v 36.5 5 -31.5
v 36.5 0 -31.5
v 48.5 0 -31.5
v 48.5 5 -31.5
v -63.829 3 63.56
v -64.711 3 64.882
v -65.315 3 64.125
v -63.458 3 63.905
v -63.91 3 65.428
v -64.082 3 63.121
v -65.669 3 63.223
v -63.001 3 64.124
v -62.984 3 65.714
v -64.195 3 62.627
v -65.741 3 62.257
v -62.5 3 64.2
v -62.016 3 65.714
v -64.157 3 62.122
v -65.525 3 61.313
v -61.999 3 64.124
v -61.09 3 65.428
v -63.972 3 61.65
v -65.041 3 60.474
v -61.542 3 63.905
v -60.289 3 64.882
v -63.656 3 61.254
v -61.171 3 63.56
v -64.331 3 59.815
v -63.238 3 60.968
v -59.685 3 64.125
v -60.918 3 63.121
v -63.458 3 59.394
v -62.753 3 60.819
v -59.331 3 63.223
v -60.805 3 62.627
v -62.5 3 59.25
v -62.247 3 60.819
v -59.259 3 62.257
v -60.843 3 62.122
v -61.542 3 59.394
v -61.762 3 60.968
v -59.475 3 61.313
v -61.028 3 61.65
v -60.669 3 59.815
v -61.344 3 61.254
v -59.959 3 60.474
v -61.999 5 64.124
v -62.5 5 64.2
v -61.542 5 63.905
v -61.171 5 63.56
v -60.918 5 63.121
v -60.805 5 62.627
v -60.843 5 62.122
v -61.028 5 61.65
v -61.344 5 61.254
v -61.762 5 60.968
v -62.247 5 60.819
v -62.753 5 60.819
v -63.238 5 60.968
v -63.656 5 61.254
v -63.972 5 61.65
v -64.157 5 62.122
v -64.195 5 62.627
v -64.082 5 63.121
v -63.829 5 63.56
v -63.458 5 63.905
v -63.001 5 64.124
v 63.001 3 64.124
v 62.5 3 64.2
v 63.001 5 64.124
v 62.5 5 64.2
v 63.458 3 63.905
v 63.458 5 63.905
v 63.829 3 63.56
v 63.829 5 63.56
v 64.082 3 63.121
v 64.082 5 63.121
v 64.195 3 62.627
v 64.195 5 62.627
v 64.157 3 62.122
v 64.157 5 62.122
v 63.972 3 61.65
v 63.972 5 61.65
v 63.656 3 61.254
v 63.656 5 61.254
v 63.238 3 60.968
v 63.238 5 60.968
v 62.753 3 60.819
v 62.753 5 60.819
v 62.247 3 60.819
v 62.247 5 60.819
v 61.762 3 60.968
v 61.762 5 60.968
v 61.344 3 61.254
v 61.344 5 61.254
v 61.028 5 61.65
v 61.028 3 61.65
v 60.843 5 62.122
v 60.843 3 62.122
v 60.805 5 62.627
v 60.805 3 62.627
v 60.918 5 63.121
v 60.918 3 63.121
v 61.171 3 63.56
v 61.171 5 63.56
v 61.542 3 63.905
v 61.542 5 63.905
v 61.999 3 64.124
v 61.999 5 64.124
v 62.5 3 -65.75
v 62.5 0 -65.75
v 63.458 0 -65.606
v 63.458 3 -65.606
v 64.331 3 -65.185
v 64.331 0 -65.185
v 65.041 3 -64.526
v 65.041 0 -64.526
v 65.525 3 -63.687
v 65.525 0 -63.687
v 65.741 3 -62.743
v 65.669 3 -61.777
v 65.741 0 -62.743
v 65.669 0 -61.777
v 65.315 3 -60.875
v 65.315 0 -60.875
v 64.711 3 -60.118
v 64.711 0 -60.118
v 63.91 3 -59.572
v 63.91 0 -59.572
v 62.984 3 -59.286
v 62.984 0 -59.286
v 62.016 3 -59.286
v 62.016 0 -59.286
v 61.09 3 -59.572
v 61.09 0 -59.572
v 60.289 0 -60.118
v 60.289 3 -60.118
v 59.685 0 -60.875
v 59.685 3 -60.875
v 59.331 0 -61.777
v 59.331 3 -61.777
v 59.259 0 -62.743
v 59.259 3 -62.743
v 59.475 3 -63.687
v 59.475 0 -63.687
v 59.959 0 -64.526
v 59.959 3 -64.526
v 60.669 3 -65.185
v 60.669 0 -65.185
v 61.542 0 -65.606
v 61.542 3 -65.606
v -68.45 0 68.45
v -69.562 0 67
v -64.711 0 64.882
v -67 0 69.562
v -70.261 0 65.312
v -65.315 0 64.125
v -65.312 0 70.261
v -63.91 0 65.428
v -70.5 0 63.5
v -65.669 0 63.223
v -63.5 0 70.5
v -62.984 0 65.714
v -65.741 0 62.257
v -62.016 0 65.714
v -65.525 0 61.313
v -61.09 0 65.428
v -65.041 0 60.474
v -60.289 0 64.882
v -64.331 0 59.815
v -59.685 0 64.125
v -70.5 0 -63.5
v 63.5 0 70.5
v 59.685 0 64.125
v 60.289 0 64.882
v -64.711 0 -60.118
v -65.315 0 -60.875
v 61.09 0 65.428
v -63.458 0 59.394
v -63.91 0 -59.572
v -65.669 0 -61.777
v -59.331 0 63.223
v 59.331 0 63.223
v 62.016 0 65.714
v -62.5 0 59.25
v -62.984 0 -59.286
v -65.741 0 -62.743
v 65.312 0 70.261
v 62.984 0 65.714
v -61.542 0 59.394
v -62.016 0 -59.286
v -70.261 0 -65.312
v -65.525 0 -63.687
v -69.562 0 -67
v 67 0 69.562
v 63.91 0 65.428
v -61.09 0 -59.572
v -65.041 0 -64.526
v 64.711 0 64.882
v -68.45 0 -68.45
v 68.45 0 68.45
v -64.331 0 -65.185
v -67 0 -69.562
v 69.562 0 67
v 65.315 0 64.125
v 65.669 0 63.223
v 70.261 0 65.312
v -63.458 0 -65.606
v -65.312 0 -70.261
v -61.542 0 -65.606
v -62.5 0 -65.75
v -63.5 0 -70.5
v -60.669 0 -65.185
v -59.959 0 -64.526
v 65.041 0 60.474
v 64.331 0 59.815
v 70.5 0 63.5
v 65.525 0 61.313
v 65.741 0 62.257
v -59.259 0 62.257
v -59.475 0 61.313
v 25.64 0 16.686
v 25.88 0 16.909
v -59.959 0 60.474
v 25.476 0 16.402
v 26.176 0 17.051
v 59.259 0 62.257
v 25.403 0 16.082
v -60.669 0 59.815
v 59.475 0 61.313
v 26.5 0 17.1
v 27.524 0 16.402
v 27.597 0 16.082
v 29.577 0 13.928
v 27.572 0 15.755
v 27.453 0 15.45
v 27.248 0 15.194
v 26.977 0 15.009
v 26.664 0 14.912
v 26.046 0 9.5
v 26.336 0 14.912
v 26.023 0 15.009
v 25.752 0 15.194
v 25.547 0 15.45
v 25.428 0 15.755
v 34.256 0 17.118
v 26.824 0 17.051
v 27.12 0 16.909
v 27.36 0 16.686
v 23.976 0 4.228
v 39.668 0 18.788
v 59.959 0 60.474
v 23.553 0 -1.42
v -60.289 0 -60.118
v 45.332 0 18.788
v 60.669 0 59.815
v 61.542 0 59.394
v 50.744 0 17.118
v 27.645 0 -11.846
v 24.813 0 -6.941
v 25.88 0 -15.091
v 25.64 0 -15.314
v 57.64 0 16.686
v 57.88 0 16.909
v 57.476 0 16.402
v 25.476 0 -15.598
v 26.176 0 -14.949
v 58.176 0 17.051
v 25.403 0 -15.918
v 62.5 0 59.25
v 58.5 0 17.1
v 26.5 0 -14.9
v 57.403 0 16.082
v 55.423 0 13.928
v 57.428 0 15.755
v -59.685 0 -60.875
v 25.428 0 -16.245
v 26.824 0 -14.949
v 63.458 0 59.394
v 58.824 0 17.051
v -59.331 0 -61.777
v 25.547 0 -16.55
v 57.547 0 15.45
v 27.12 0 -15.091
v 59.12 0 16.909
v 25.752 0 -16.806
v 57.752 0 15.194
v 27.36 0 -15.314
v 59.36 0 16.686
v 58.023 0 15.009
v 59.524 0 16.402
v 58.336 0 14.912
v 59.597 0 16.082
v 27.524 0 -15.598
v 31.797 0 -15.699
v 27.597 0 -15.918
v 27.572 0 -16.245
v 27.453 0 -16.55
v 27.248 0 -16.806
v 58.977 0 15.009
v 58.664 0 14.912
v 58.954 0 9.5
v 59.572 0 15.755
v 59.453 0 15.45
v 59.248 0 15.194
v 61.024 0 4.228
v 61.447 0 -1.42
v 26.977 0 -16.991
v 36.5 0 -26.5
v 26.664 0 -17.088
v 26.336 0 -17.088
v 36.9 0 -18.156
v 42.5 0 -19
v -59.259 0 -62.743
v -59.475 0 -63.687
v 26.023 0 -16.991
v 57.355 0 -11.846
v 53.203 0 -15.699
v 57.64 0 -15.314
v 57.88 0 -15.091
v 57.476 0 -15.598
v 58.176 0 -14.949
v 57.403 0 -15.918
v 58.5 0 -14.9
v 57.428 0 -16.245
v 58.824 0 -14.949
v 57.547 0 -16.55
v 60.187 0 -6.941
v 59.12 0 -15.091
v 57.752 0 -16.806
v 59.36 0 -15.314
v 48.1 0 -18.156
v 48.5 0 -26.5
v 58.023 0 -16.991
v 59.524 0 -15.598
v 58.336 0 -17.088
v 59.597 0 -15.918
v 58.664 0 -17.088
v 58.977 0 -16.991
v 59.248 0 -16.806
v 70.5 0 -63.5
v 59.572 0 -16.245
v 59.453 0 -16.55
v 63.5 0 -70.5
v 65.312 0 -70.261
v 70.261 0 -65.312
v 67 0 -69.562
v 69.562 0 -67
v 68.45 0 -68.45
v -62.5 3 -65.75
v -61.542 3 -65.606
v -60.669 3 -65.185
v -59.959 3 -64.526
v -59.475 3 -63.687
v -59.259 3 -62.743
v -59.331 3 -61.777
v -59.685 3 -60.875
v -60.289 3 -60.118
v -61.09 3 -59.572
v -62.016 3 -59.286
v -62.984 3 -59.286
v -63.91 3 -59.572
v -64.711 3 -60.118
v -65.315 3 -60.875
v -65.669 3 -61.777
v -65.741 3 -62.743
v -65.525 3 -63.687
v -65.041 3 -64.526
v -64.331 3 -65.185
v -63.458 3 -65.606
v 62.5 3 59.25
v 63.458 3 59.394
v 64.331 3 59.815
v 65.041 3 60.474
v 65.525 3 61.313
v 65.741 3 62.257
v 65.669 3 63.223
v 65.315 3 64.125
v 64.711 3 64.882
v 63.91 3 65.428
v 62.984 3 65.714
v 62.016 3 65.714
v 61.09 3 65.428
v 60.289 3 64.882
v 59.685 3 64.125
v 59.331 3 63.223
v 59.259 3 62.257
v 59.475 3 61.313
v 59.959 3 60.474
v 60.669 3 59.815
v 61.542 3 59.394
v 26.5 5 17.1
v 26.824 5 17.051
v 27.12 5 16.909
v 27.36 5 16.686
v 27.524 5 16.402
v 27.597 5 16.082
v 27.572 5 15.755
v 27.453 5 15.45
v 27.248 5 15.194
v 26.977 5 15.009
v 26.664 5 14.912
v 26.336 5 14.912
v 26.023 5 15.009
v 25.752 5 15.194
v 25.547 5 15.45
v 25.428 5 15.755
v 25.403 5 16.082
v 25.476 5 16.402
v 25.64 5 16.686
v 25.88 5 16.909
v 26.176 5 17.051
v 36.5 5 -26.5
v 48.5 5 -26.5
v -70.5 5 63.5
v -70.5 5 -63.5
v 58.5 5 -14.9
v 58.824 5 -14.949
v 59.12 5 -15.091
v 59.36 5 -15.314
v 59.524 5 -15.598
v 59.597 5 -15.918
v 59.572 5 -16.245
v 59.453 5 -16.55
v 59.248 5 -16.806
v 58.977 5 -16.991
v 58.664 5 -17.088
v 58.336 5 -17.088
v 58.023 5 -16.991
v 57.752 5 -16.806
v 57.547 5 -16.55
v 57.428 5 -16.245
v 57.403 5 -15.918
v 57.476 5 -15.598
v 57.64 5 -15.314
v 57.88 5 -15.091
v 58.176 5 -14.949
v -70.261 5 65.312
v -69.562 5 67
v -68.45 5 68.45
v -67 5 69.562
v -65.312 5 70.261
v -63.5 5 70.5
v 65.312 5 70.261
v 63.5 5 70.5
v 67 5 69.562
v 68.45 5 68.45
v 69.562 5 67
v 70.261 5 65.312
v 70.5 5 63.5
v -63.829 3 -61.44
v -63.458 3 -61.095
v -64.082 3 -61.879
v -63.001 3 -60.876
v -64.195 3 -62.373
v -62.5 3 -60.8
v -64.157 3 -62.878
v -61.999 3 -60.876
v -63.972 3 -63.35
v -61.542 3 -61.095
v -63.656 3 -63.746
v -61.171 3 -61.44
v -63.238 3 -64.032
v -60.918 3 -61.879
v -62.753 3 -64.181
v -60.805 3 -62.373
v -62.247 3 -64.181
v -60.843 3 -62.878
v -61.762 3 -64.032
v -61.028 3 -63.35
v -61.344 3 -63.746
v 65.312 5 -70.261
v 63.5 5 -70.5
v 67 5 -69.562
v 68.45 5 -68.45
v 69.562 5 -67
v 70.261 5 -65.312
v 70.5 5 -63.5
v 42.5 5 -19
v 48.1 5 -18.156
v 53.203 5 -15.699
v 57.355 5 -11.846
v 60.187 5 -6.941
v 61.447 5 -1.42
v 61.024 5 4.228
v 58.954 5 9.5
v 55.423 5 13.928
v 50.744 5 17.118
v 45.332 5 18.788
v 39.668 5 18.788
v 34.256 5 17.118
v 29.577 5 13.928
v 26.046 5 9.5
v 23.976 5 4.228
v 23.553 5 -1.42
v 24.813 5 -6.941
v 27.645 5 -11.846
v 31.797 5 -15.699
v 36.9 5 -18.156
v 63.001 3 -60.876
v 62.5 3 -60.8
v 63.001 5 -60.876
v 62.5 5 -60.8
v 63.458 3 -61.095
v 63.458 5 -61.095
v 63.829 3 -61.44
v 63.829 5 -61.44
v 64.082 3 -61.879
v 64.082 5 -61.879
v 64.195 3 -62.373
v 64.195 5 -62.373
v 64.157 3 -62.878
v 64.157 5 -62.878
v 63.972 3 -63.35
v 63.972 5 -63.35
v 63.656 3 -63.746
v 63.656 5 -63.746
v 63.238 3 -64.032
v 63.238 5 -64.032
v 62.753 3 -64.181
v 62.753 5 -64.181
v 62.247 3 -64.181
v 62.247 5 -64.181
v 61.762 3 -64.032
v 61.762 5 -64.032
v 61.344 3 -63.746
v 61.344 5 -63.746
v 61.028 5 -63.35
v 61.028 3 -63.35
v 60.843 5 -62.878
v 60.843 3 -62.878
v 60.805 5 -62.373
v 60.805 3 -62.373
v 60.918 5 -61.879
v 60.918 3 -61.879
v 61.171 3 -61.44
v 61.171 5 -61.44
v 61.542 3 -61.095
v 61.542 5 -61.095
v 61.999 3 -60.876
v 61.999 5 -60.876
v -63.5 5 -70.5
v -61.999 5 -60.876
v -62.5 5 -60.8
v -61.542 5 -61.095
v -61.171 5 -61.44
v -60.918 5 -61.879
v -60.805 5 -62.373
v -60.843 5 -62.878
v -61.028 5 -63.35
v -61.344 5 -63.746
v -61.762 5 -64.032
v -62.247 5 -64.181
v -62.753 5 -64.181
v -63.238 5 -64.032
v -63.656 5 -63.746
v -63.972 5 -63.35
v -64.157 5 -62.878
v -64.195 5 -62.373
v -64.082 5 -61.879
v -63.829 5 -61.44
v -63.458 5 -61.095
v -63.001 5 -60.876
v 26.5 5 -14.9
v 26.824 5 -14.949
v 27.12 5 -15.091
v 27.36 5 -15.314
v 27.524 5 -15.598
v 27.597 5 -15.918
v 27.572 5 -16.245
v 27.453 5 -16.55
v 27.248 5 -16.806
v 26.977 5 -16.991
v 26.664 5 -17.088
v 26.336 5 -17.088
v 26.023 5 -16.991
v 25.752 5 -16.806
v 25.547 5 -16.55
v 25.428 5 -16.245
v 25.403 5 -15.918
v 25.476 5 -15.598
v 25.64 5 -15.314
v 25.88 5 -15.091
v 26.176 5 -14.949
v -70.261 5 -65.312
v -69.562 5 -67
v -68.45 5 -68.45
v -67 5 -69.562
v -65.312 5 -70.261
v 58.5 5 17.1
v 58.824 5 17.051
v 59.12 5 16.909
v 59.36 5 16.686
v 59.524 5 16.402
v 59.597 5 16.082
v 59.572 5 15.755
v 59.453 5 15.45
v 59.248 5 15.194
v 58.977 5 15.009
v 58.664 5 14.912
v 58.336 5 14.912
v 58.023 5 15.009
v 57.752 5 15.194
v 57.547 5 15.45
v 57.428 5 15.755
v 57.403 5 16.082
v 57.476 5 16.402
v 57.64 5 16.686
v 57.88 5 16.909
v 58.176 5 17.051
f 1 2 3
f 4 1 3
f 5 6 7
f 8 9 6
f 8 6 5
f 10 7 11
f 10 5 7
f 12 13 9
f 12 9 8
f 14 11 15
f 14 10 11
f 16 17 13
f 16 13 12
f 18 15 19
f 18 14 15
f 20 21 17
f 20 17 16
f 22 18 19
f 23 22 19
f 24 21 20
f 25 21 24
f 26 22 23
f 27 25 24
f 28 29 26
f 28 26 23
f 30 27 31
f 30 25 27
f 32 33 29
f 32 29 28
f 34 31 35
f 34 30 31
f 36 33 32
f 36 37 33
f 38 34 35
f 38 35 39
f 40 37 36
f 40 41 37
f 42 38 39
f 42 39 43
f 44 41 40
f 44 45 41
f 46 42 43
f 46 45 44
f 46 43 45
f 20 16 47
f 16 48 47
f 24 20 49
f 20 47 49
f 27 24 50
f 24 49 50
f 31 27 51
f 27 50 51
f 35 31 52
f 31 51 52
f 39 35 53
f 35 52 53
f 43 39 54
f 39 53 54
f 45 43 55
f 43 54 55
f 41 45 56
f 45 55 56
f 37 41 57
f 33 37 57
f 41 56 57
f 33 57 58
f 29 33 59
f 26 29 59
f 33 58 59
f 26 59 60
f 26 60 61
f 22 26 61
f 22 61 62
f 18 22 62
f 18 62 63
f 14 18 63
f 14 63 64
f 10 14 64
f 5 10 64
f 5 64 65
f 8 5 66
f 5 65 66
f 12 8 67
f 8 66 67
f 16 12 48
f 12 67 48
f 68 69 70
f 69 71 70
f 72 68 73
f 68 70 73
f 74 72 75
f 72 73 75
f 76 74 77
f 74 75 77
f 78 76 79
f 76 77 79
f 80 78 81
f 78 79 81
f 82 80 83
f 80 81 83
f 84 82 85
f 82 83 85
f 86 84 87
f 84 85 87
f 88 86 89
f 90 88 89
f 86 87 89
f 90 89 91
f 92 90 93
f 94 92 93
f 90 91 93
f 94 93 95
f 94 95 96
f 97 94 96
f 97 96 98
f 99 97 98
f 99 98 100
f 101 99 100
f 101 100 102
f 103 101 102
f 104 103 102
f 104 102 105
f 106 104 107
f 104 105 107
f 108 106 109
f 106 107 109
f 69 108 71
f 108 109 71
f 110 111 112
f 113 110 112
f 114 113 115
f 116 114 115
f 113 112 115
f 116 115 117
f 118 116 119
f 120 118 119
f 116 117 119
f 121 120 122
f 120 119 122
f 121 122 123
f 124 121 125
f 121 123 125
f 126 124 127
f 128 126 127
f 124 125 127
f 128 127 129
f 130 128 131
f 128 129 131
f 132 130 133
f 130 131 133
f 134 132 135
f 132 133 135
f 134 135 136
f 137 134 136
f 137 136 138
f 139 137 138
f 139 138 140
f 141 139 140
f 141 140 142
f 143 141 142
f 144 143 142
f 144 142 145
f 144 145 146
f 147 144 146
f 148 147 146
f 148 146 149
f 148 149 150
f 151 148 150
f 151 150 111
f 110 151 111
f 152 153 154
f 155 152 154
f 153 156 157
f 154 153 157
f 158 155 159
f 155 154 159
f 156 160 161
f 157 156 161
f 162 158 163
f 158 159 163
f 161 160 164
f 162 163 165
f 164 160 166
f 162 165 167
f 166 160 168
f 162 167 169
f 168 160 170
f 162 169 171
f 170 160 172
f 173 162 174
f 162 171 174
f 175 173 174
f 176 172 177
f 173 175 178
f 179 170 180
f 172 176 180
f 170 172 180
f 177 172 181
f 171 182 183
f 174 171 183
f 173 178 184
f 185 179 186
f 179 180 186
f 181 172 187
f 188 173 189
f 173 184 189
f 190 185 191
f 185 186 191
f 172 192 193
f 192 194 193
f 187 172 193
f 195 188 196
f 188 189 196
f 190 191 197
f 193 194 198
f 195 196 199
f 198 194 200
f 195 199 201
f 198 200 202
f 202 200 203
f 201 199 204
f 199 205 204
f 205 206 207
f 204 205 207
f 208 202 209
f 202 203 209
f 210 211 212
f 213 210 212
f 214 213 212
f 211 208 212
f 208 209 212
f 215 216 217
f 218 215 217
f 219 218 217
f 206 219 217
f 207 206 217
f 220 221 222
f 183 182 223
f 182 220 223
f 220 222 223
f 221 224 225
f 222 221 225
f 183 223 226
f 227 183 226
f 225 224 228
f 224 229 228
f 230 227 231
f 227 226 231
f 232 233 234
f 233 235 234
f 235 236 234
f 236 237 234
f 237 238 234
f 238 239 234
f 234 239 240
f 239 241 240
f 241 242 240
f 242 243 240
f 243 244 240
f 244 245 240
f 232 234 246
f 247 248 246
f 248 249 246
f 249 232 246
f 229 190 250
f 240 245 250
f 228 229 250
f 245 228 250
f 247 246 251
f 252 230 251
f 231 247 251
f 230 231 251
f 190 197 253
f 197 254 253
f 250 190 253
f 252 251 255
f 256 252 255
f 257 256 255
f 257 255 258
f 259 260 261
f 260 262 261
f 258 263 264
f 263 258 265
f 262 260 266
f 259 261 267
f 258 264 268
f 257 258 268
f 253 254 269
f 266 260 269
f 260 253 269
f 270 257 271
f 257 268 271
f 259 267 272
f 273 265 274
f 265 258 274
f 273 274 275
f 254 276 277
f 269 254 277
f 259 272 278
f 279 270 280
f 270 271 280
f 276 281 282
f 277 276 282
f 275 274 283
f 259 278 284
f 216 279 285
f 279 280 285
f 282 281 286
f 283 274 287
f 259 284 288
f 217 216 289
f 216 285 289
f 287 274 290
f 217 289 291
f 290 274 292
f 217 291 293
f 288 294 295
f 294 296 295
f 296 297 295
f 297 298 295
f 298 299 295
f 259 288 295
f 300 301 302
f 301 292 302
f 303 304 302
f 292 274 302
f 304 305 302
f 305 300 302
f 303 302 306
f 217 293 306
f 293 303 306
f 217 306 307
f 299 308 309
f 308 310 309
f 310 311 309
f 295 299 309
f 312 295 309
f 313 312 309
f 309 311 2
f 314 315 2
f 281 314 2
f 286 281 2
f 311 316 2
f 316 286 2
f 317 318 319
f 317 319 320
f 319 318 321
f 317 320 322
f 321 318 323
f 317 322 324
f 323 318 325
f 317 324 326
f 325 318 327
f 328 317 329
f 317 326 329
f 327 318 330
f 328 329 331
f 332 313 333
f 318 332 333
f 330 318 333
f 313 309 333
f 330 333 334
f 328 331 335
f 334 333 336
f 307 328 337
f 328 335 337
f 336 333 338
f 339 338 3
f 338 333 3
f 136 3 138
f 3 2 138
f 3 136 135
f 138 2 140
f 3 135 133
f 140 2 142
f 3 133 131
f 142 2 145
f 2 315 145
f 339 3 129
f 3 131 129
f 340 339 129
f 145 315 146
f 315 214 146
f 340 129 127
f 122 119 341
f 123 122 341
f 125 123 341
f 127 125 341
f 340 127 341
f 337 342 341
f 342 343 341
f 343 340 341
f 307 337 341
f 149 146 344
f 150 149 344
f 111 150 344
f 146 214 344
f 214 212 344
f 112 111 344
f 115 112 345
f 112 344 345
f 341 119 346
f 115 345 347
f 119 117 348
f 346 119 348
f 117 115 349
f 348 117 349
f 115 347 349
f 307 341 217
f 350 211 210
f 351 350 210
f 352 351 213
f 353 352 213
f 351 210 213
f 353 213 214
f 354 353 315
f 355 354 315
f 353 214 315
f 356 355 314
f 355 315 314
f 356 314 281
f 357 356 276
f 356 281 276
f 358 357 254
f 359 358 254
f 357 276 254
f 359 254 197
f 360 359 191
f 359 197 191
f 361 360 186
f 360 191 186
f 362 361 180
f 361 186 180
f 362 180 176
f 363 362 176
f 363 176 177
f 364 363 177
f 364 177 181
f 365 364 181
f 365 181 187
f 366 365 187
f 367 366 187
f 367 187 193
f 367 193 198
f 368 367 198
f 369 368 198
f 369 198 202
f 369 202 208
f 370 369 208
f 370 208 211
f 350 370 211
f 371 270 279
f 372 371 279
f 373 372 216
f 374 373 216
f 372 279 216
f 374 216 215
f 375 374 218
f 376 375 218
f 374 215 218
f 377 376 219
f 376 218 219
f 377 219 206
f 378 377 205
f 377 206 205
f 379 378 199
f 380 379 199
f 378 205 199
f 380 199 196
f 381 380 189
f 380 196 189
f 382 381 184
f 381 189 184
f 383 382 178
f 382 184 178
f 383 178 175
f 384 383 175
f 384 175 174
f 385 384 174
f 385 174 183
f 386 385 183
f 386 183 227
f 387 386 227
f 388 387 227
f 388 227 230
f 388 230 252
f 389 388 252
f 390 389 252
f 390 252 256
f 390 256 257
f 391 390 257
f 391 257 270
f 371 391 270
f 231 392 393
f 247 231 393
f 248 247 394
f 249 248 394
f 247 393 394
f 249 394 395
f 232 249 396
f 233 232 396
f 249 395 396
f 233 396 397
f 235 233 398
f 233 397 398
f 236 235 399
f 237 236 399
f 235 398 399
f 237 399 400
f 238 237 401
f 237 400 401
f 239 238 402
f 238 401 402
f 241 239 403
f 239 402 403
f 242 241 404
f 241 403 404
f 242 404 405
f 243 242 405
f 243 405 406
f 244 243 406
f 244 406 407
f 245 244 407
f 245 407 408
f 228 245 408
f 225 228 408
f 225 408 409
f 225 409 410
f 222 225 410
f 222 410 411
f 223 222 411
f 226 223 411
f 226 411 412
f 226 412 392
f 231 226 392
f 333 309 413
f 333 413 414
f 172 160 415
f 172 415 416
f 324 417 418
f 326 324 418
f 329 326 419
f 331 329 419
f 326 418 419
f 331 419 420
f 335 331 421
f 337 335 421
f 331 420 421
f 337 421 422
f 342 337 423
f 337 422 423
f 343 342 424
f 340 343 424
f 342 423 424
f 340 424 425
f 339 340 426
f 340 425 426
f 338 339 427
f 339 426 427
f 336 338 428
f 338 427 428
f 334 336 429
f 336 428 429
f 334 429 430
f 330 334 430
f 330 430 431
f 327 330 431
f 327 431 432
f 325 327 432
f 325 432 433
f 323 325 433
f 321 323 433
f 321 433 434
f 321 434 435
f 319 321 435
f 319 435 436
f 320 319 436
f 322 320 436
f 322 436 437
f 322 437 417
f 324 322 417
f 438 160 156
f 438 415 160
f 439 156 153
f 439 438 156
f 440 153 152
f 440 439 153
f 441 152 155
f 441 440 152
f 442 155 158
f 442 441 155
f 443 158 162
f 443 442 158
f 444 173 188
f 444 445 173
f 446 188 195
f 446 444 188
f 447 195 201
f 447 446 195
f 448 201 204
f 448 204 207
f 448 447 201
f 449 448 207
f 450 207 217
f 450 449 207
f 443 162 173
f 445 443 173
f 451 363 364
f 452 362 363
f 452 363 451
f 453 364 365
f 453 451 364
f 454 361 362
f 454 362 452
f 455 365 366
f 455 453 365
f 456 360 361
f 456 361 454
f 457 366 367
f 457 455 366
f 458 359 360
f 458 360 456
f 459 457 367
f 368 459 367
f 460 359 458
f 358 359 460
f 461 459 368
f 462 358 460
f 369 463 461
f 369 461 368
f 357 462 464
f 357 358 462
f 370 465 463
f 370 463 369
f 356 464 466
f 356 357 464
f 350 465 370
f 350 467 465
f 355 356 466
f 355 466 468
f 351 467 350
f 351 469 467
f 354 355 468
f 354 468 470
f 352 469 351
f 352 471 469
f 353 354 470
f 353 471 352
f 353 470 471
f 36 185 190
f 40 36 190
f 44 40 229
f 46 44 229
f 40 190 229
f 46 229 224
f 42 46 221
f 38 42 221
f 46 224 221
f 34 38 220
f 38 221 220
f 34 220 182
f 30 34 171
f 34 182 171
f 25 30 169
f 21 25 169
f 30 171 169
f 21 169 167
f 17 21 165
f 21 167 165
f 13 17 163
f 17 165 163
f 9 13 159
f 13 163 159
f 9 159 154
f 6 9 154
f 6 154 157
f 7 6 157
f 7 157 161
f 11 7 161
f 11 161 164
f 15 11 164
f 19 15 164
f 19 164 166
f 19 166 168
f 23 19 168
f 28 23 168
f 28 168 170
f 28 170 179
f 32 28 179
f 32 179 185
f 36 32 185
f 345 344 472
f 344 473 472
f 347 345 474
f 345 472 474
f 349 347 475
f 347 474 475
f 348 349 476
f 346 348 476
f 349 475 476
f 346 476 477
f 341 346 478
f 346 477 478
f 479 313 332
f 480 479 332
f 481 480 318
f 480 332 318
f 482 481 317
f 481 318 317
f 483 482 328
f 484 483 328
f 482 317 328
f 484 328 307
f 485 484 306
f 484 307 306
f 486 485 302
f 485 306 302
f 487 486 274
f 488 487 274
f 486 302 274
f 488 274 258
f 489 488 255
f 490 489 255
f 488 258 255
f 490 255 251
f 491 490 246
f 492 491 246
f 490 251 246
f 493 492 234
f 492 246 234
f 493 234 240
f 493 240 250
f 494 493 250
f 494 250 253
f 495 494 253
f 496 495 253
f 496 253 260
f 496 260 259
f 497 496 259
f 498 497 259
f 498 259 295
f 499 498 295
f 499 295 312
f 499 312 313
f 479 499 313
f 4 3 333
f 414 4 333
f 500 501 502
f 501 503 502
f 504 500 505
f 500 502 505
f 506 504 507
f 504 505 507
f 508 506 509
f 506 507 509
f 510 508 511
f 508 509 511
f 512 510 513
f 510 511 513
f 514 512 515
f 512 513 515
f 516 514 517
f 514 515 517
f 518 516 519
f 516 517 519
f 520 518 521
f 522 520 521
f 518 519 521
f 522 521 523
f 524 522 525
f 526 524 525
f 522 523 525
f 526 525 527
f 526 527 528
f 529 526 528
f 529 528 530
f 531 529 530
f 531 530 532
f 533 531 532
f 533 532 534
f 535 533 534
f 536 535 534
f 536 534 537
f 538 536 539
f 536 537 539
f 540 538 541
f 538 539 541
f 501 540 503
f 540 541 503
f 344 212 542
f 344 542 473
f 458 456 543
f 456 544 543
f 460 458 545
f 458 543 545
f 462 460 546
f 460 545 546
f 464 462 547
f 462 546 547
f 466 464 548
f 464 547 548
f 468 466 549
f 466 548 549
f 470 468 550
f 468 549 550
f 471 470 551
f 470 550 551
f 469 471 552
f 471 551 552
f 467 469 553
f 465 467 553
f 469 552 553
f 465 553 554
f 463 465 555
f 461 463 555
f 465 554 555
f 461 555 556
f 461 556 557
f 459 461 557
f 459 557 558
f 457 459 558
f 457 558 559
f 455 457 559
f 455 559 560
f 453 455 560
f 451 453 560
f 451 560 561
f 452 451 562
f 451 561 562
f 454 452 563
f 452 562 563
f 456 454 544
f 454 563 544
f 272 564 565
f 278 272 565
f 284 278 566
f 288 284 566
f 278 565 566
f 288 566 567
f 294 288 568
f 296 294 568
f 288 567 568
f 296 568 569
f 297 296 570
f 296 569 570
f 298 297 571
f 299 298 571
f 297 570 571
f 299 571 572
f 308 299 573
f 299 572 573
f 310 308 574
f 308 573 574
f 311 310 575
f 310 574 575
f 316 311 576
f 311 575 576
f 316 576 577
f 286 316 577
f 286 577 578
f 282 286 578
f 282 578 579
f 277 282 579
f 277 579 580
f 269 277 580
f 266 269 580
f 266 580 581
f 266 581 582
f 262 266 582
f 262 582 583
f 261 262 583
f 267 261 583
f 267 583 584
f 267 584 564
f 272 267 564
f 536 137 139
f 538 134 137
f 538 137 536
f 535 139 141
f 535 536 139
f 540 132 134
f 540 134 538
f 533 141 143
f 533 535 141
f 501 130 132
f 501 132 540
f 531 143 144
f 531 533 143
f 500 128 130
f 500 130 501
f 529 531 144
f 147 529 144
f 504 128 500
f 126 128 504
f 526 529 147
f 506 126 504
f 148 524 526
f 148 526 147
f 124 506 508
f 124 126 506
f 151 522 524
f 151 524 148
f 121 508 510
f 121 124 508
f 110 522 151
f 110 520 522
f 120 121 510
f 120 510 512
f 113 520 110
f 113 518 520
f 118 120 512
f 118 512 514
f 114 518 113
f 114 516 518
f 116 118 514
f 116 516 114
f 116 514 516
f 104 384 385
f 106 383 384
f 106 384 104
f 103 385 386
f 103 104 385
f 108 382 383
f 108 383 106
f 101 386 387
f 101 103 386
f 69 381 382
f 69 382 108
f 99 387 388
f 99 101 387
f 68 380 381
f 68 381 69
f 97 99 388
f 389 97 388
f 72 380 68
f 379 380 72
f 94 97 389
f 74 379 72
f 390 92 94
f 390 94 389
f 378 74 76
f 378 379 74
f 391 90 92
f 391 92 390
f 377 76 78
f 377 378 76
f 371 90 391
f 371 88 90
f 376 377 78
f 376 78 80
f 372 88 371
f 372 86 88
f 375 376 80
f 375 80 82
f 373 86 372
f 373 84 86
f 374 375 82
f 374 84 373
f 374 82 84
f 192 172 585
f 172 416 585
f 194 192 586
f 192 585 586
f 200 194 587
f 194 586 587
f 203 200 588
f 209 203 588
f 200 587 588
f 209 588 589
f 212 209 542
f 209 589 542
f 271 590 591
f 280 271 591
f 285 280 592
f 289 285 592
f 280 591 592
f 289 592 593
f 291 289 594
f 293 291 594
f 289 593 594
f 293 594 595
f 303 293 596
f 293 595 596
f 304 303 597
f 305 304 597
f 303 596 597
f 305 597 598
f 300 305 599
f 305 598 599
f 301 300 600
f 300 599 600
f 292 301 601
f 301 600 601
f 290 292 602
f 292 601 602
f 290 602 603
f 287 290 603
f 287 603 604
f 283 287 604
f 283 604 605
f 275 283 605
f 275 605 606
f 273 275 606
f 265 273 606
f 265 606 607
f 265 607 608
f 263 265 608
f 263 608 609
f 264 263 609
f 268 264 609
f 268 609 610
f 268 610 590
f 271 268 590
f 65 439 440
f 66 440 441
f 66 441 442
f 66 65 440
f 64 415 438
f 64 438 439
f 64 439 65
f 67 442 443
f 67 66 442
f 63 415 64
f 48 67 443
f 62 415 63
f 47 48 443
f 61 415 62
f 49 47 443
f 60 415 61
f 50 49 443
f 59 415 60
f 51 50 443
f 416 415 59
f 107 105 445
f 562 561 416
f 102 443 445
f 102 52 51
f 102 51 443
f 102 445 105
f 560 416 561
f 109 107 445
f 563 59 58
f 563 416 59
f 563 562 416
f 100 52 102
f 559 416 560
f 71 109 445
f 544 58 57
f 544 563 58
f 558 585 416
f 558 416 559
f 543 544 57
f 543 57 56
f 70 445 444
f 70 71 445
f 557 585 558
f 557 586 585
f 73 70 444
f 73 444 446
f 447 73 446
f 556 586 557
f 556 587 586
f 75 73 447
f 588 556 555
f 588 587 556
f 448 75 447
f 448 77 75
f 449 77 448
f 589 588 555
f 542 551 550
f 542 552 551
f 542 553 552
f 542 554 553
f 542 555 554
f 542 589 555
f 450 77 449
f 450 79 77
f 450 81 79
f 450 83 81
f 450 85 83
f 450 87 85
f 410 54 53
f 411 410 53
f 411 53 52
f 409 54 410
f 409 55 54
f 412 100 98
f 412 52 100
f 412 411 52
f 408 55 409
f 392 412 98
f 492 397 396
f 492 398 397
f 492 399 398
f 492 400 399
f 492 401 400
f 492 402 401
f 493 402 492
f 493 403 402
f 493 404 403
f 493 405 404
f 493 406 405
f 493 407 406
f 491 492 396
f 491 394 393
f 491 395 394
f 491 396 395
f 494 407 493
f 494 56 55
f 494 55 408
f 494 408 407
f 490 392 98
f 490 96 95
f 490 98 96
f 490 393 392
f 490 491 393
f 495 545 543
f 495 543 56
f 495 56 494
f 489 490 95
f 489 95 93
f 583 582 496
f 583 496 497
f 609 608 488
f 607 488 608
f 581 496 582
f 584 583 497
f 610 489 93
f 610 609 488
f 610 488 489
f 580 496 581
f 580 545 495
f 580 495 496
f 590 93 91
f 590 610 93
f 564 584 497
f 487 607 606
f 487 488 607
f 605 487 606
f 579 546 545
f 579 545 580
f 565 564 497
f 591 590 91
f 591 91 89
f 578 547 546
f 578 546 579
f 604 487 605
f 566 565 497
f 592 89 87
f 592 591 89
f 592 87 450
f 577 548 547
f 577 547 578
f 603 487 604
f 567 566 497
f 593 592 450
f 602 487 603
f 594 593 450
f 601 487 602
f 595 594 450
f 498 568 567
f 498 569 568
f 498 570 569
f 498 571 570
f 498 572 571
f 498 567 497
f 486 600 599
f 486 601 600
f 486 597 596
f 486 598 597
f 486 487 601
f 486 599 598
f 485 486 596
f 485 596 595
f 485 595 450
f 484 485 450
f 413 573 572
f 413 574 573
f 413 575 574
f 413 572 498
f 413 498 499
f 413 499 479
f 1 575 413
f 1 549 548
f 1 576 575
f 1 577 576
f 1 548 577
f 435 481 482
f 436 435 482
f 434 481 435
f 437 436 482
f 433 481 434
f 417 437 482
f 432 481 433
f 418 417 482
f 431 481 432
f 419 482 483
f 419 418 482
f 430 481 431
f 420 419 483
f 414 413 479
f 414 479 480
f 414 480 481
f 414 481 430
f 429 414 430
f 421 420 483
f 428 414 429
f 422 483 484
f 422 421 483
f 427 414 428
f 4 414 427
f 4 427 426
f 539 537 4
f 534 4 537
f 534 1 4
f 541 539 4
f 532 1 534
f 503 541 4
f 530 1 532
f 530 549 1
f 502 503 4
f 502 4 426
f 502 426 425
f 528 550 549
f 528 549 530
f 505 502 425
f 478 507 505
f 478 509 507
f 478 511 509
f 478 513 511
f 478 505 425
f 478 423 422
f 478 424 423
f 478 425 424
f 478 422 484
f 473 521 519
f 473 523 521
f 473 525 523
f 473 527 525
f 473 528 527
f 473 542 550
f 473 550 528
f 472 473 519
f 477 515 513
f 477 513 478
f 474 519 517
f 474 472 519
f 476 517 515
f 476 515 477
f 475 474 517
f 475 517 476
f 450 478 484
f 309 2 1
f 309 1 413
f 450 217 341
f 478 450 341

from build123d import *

# Parameters (mm, degrees)
SKETCH1_W                      = 141
SKETCH1_H                      = 141
BOSS_EXTRUDE1_DEPTH            = 5
CUT_EXTRUDE1_REACH             = 101.827
SKETCH3_R                      = 1.1
CBORE_FOR_M3_SHCS1_D           = 3.4
CBORE_FOR_M3_SHCS1_CBORE_D     = 6.5
CBORE_FOR_M3_SHCS1_CBORE_DEPTH = 3
FILLET1_R                      = 7
ESQUISSE1_R                    = 19
ENL_V_MAT_EXTRU_1_DEPTH        = 100.827350962
ESQUISSE2_W                    = 12
ESQUISSE2_H                    = 5
ENL_V_MAT_EXTRU_2_DEPTH        = 100.827350962


with BuildPart() as part:
    # Sketch1 → Boss-Extrude1 (new body)
    with BuildSketch(Plane(origin=(0, 0, 0), x_dir=(1, 0, 0), z_dir=(0, 1, 0))):
        Rectangle(SKETCH1_W, SKETCH1_H)
    extrude(amount=BOSS_EXTRUDE1_DEPTH)

    # Sketch3 → Cut-Extrude1 (cut, up to next)
    with BuildSketch(Plane(origin=(0, 5, 0), x_dir=(1, 0, 0), z_dir=(0, 1, 0)), mode=Mode.PRIVATE) as cut_extrude1_sk1:
        with Locations(Location((26.5, 16, 0), (0, 0, 270))):
            Circle(SKETCH3_R)
    cut_extrude1_tool1 = extrude(cut_extrude1_sk1.sketch, amount=-CUT_EXTRUDE1_REACH, mode=Mode.PRIVATE) & part.part
    # Sketch3 → Cut-Extrude1 (cut, up to next)
    with BuildSketch(Plane(origin=(0, 5, 0), x_dir=(1, 0, 0), z_dir=(0, 1, 0)), mode=Mode.PRIVATE) as cut_extrude1_sk2:
        with Locations(Location((58.5, 16, 0), (0, 0, 270))):
            Circle(SKETCH3_R)
    cut_extrude1_tool2 = extrude(cut_extrude1_sk2.sketch, amount=-CUT_EXTRUDE1_REACH, mode=Mode.PRIVATE) & part.part
    # Sketch3 → Cut-Extrude1 (cut, up to next)
    with BuildSketch(Plane(origin=(0, 5, 0), x_dir=(1, 0, 0), z_dir=(0, 1, 0)), mode=Mode.PRIVATE) as cut_extrude1_sk3:
        with Locations(Location((58.5, -16, 0), (0, 0, 270))):
            Circle(SKETCH3_R)
    cut_extrude1_tool3 = extrude(cut_extrude1_sk3.sketch, amount=-CUT_EXTRUDE1_REACH, mode=Mode.PRIVATE) & part.part
    # Sketch3 → Cut-Extrude1 (cut, up to next)
    with BuildSketch(Plane(origin=(0, 5, 0), x_dir=(1, 0, 0), z_dir=(0, 1, 0)), mode=Mode.PRIVATE) as cut_extrude1_sk4:
        with Locations(Location((26.5, -16, 0), (0, 0, 270))):
            Circle(SKETCH3_R)
    cut_extrude1_tool4 = extrude(cut_extrude1_sk4.sketch, amount=-CUT_EXTRUDE1_REACH, mode=Mode.PRIVATE) & part.part
    add(cut_extrude1_tool1.solids().sort_by_distance((26.5, 5, -16))[0], mode=Mode.SUBTRACT)
    add(cut_extrude1_tool2.solids().sort_by_distance((58.5, 5, -16))[0], mode=Mode.SUBTRACT)
    add(cut_extrude1_tool3.solids().sort_by_distance((58.5, 5, 16))[0], mode=Mode.SUBTRACT)
    add(cut_extrude1_tool4.solids().sort_by_distance((26.5, 5, 16))[0], mode=Mode.SUBTRACT)

    # CBORE for M3 SHCS1 (through all)
    with Locations(Plane(origin=(-62.5, 0, 62.5), x_dir=(0, 0, -1), z_dir=(0, -1, 0))):
        with Locations((0, 0), (125, 0), (125, 125), (0, 125)):
            CounterBoreHole(CBORE_FOR_M3_SHCS1_D / 2, CBORE_FOR_M3_SHCS1_CBORE_D / 2, CBORE_FOR_M3_SHCS1_CBORE_DEPTH)

    # Fillet1
    fillet1_edges = [part.edges().sort_by_distance(p)[0] for p in [
        (70.5, 2.5, 70.5),
        (-70.5, 2.5, 70.5),
        (-70.5, 2.5, -70.5),
        (70.5, 2.5, -70.5),
    ]]
    fillet(fillet1_edges, radius=FILLET1_R)

    # Esquisse1 → Enlèv. mat.-Extru.1 (cut, through all)
    with BuildSketch(Plane.XZ):
        with Locations(Location((42.5, 0, 0), (0, 0, 270))):
            Circle(ESQUISSE1_R)
    extrude(amount=-ENL_V_MAT_EXTRU_1_DEPTH, mode=Mode.SUBTRACT)

    # Esquisse2 → Enlèv. mat.-Extru.2 (cut, through all)
    with BuildSketch(Plane.XZ):
        with Locations((42.5, -29)):
            Rectangle(ESQUISSE2_W, ESQUISSE2_H)
    extrude(amount=-ENL_V_MAT_EXTRU_2_DEPTH, mode=Mode.SUBTRACT)


solid = part.part
